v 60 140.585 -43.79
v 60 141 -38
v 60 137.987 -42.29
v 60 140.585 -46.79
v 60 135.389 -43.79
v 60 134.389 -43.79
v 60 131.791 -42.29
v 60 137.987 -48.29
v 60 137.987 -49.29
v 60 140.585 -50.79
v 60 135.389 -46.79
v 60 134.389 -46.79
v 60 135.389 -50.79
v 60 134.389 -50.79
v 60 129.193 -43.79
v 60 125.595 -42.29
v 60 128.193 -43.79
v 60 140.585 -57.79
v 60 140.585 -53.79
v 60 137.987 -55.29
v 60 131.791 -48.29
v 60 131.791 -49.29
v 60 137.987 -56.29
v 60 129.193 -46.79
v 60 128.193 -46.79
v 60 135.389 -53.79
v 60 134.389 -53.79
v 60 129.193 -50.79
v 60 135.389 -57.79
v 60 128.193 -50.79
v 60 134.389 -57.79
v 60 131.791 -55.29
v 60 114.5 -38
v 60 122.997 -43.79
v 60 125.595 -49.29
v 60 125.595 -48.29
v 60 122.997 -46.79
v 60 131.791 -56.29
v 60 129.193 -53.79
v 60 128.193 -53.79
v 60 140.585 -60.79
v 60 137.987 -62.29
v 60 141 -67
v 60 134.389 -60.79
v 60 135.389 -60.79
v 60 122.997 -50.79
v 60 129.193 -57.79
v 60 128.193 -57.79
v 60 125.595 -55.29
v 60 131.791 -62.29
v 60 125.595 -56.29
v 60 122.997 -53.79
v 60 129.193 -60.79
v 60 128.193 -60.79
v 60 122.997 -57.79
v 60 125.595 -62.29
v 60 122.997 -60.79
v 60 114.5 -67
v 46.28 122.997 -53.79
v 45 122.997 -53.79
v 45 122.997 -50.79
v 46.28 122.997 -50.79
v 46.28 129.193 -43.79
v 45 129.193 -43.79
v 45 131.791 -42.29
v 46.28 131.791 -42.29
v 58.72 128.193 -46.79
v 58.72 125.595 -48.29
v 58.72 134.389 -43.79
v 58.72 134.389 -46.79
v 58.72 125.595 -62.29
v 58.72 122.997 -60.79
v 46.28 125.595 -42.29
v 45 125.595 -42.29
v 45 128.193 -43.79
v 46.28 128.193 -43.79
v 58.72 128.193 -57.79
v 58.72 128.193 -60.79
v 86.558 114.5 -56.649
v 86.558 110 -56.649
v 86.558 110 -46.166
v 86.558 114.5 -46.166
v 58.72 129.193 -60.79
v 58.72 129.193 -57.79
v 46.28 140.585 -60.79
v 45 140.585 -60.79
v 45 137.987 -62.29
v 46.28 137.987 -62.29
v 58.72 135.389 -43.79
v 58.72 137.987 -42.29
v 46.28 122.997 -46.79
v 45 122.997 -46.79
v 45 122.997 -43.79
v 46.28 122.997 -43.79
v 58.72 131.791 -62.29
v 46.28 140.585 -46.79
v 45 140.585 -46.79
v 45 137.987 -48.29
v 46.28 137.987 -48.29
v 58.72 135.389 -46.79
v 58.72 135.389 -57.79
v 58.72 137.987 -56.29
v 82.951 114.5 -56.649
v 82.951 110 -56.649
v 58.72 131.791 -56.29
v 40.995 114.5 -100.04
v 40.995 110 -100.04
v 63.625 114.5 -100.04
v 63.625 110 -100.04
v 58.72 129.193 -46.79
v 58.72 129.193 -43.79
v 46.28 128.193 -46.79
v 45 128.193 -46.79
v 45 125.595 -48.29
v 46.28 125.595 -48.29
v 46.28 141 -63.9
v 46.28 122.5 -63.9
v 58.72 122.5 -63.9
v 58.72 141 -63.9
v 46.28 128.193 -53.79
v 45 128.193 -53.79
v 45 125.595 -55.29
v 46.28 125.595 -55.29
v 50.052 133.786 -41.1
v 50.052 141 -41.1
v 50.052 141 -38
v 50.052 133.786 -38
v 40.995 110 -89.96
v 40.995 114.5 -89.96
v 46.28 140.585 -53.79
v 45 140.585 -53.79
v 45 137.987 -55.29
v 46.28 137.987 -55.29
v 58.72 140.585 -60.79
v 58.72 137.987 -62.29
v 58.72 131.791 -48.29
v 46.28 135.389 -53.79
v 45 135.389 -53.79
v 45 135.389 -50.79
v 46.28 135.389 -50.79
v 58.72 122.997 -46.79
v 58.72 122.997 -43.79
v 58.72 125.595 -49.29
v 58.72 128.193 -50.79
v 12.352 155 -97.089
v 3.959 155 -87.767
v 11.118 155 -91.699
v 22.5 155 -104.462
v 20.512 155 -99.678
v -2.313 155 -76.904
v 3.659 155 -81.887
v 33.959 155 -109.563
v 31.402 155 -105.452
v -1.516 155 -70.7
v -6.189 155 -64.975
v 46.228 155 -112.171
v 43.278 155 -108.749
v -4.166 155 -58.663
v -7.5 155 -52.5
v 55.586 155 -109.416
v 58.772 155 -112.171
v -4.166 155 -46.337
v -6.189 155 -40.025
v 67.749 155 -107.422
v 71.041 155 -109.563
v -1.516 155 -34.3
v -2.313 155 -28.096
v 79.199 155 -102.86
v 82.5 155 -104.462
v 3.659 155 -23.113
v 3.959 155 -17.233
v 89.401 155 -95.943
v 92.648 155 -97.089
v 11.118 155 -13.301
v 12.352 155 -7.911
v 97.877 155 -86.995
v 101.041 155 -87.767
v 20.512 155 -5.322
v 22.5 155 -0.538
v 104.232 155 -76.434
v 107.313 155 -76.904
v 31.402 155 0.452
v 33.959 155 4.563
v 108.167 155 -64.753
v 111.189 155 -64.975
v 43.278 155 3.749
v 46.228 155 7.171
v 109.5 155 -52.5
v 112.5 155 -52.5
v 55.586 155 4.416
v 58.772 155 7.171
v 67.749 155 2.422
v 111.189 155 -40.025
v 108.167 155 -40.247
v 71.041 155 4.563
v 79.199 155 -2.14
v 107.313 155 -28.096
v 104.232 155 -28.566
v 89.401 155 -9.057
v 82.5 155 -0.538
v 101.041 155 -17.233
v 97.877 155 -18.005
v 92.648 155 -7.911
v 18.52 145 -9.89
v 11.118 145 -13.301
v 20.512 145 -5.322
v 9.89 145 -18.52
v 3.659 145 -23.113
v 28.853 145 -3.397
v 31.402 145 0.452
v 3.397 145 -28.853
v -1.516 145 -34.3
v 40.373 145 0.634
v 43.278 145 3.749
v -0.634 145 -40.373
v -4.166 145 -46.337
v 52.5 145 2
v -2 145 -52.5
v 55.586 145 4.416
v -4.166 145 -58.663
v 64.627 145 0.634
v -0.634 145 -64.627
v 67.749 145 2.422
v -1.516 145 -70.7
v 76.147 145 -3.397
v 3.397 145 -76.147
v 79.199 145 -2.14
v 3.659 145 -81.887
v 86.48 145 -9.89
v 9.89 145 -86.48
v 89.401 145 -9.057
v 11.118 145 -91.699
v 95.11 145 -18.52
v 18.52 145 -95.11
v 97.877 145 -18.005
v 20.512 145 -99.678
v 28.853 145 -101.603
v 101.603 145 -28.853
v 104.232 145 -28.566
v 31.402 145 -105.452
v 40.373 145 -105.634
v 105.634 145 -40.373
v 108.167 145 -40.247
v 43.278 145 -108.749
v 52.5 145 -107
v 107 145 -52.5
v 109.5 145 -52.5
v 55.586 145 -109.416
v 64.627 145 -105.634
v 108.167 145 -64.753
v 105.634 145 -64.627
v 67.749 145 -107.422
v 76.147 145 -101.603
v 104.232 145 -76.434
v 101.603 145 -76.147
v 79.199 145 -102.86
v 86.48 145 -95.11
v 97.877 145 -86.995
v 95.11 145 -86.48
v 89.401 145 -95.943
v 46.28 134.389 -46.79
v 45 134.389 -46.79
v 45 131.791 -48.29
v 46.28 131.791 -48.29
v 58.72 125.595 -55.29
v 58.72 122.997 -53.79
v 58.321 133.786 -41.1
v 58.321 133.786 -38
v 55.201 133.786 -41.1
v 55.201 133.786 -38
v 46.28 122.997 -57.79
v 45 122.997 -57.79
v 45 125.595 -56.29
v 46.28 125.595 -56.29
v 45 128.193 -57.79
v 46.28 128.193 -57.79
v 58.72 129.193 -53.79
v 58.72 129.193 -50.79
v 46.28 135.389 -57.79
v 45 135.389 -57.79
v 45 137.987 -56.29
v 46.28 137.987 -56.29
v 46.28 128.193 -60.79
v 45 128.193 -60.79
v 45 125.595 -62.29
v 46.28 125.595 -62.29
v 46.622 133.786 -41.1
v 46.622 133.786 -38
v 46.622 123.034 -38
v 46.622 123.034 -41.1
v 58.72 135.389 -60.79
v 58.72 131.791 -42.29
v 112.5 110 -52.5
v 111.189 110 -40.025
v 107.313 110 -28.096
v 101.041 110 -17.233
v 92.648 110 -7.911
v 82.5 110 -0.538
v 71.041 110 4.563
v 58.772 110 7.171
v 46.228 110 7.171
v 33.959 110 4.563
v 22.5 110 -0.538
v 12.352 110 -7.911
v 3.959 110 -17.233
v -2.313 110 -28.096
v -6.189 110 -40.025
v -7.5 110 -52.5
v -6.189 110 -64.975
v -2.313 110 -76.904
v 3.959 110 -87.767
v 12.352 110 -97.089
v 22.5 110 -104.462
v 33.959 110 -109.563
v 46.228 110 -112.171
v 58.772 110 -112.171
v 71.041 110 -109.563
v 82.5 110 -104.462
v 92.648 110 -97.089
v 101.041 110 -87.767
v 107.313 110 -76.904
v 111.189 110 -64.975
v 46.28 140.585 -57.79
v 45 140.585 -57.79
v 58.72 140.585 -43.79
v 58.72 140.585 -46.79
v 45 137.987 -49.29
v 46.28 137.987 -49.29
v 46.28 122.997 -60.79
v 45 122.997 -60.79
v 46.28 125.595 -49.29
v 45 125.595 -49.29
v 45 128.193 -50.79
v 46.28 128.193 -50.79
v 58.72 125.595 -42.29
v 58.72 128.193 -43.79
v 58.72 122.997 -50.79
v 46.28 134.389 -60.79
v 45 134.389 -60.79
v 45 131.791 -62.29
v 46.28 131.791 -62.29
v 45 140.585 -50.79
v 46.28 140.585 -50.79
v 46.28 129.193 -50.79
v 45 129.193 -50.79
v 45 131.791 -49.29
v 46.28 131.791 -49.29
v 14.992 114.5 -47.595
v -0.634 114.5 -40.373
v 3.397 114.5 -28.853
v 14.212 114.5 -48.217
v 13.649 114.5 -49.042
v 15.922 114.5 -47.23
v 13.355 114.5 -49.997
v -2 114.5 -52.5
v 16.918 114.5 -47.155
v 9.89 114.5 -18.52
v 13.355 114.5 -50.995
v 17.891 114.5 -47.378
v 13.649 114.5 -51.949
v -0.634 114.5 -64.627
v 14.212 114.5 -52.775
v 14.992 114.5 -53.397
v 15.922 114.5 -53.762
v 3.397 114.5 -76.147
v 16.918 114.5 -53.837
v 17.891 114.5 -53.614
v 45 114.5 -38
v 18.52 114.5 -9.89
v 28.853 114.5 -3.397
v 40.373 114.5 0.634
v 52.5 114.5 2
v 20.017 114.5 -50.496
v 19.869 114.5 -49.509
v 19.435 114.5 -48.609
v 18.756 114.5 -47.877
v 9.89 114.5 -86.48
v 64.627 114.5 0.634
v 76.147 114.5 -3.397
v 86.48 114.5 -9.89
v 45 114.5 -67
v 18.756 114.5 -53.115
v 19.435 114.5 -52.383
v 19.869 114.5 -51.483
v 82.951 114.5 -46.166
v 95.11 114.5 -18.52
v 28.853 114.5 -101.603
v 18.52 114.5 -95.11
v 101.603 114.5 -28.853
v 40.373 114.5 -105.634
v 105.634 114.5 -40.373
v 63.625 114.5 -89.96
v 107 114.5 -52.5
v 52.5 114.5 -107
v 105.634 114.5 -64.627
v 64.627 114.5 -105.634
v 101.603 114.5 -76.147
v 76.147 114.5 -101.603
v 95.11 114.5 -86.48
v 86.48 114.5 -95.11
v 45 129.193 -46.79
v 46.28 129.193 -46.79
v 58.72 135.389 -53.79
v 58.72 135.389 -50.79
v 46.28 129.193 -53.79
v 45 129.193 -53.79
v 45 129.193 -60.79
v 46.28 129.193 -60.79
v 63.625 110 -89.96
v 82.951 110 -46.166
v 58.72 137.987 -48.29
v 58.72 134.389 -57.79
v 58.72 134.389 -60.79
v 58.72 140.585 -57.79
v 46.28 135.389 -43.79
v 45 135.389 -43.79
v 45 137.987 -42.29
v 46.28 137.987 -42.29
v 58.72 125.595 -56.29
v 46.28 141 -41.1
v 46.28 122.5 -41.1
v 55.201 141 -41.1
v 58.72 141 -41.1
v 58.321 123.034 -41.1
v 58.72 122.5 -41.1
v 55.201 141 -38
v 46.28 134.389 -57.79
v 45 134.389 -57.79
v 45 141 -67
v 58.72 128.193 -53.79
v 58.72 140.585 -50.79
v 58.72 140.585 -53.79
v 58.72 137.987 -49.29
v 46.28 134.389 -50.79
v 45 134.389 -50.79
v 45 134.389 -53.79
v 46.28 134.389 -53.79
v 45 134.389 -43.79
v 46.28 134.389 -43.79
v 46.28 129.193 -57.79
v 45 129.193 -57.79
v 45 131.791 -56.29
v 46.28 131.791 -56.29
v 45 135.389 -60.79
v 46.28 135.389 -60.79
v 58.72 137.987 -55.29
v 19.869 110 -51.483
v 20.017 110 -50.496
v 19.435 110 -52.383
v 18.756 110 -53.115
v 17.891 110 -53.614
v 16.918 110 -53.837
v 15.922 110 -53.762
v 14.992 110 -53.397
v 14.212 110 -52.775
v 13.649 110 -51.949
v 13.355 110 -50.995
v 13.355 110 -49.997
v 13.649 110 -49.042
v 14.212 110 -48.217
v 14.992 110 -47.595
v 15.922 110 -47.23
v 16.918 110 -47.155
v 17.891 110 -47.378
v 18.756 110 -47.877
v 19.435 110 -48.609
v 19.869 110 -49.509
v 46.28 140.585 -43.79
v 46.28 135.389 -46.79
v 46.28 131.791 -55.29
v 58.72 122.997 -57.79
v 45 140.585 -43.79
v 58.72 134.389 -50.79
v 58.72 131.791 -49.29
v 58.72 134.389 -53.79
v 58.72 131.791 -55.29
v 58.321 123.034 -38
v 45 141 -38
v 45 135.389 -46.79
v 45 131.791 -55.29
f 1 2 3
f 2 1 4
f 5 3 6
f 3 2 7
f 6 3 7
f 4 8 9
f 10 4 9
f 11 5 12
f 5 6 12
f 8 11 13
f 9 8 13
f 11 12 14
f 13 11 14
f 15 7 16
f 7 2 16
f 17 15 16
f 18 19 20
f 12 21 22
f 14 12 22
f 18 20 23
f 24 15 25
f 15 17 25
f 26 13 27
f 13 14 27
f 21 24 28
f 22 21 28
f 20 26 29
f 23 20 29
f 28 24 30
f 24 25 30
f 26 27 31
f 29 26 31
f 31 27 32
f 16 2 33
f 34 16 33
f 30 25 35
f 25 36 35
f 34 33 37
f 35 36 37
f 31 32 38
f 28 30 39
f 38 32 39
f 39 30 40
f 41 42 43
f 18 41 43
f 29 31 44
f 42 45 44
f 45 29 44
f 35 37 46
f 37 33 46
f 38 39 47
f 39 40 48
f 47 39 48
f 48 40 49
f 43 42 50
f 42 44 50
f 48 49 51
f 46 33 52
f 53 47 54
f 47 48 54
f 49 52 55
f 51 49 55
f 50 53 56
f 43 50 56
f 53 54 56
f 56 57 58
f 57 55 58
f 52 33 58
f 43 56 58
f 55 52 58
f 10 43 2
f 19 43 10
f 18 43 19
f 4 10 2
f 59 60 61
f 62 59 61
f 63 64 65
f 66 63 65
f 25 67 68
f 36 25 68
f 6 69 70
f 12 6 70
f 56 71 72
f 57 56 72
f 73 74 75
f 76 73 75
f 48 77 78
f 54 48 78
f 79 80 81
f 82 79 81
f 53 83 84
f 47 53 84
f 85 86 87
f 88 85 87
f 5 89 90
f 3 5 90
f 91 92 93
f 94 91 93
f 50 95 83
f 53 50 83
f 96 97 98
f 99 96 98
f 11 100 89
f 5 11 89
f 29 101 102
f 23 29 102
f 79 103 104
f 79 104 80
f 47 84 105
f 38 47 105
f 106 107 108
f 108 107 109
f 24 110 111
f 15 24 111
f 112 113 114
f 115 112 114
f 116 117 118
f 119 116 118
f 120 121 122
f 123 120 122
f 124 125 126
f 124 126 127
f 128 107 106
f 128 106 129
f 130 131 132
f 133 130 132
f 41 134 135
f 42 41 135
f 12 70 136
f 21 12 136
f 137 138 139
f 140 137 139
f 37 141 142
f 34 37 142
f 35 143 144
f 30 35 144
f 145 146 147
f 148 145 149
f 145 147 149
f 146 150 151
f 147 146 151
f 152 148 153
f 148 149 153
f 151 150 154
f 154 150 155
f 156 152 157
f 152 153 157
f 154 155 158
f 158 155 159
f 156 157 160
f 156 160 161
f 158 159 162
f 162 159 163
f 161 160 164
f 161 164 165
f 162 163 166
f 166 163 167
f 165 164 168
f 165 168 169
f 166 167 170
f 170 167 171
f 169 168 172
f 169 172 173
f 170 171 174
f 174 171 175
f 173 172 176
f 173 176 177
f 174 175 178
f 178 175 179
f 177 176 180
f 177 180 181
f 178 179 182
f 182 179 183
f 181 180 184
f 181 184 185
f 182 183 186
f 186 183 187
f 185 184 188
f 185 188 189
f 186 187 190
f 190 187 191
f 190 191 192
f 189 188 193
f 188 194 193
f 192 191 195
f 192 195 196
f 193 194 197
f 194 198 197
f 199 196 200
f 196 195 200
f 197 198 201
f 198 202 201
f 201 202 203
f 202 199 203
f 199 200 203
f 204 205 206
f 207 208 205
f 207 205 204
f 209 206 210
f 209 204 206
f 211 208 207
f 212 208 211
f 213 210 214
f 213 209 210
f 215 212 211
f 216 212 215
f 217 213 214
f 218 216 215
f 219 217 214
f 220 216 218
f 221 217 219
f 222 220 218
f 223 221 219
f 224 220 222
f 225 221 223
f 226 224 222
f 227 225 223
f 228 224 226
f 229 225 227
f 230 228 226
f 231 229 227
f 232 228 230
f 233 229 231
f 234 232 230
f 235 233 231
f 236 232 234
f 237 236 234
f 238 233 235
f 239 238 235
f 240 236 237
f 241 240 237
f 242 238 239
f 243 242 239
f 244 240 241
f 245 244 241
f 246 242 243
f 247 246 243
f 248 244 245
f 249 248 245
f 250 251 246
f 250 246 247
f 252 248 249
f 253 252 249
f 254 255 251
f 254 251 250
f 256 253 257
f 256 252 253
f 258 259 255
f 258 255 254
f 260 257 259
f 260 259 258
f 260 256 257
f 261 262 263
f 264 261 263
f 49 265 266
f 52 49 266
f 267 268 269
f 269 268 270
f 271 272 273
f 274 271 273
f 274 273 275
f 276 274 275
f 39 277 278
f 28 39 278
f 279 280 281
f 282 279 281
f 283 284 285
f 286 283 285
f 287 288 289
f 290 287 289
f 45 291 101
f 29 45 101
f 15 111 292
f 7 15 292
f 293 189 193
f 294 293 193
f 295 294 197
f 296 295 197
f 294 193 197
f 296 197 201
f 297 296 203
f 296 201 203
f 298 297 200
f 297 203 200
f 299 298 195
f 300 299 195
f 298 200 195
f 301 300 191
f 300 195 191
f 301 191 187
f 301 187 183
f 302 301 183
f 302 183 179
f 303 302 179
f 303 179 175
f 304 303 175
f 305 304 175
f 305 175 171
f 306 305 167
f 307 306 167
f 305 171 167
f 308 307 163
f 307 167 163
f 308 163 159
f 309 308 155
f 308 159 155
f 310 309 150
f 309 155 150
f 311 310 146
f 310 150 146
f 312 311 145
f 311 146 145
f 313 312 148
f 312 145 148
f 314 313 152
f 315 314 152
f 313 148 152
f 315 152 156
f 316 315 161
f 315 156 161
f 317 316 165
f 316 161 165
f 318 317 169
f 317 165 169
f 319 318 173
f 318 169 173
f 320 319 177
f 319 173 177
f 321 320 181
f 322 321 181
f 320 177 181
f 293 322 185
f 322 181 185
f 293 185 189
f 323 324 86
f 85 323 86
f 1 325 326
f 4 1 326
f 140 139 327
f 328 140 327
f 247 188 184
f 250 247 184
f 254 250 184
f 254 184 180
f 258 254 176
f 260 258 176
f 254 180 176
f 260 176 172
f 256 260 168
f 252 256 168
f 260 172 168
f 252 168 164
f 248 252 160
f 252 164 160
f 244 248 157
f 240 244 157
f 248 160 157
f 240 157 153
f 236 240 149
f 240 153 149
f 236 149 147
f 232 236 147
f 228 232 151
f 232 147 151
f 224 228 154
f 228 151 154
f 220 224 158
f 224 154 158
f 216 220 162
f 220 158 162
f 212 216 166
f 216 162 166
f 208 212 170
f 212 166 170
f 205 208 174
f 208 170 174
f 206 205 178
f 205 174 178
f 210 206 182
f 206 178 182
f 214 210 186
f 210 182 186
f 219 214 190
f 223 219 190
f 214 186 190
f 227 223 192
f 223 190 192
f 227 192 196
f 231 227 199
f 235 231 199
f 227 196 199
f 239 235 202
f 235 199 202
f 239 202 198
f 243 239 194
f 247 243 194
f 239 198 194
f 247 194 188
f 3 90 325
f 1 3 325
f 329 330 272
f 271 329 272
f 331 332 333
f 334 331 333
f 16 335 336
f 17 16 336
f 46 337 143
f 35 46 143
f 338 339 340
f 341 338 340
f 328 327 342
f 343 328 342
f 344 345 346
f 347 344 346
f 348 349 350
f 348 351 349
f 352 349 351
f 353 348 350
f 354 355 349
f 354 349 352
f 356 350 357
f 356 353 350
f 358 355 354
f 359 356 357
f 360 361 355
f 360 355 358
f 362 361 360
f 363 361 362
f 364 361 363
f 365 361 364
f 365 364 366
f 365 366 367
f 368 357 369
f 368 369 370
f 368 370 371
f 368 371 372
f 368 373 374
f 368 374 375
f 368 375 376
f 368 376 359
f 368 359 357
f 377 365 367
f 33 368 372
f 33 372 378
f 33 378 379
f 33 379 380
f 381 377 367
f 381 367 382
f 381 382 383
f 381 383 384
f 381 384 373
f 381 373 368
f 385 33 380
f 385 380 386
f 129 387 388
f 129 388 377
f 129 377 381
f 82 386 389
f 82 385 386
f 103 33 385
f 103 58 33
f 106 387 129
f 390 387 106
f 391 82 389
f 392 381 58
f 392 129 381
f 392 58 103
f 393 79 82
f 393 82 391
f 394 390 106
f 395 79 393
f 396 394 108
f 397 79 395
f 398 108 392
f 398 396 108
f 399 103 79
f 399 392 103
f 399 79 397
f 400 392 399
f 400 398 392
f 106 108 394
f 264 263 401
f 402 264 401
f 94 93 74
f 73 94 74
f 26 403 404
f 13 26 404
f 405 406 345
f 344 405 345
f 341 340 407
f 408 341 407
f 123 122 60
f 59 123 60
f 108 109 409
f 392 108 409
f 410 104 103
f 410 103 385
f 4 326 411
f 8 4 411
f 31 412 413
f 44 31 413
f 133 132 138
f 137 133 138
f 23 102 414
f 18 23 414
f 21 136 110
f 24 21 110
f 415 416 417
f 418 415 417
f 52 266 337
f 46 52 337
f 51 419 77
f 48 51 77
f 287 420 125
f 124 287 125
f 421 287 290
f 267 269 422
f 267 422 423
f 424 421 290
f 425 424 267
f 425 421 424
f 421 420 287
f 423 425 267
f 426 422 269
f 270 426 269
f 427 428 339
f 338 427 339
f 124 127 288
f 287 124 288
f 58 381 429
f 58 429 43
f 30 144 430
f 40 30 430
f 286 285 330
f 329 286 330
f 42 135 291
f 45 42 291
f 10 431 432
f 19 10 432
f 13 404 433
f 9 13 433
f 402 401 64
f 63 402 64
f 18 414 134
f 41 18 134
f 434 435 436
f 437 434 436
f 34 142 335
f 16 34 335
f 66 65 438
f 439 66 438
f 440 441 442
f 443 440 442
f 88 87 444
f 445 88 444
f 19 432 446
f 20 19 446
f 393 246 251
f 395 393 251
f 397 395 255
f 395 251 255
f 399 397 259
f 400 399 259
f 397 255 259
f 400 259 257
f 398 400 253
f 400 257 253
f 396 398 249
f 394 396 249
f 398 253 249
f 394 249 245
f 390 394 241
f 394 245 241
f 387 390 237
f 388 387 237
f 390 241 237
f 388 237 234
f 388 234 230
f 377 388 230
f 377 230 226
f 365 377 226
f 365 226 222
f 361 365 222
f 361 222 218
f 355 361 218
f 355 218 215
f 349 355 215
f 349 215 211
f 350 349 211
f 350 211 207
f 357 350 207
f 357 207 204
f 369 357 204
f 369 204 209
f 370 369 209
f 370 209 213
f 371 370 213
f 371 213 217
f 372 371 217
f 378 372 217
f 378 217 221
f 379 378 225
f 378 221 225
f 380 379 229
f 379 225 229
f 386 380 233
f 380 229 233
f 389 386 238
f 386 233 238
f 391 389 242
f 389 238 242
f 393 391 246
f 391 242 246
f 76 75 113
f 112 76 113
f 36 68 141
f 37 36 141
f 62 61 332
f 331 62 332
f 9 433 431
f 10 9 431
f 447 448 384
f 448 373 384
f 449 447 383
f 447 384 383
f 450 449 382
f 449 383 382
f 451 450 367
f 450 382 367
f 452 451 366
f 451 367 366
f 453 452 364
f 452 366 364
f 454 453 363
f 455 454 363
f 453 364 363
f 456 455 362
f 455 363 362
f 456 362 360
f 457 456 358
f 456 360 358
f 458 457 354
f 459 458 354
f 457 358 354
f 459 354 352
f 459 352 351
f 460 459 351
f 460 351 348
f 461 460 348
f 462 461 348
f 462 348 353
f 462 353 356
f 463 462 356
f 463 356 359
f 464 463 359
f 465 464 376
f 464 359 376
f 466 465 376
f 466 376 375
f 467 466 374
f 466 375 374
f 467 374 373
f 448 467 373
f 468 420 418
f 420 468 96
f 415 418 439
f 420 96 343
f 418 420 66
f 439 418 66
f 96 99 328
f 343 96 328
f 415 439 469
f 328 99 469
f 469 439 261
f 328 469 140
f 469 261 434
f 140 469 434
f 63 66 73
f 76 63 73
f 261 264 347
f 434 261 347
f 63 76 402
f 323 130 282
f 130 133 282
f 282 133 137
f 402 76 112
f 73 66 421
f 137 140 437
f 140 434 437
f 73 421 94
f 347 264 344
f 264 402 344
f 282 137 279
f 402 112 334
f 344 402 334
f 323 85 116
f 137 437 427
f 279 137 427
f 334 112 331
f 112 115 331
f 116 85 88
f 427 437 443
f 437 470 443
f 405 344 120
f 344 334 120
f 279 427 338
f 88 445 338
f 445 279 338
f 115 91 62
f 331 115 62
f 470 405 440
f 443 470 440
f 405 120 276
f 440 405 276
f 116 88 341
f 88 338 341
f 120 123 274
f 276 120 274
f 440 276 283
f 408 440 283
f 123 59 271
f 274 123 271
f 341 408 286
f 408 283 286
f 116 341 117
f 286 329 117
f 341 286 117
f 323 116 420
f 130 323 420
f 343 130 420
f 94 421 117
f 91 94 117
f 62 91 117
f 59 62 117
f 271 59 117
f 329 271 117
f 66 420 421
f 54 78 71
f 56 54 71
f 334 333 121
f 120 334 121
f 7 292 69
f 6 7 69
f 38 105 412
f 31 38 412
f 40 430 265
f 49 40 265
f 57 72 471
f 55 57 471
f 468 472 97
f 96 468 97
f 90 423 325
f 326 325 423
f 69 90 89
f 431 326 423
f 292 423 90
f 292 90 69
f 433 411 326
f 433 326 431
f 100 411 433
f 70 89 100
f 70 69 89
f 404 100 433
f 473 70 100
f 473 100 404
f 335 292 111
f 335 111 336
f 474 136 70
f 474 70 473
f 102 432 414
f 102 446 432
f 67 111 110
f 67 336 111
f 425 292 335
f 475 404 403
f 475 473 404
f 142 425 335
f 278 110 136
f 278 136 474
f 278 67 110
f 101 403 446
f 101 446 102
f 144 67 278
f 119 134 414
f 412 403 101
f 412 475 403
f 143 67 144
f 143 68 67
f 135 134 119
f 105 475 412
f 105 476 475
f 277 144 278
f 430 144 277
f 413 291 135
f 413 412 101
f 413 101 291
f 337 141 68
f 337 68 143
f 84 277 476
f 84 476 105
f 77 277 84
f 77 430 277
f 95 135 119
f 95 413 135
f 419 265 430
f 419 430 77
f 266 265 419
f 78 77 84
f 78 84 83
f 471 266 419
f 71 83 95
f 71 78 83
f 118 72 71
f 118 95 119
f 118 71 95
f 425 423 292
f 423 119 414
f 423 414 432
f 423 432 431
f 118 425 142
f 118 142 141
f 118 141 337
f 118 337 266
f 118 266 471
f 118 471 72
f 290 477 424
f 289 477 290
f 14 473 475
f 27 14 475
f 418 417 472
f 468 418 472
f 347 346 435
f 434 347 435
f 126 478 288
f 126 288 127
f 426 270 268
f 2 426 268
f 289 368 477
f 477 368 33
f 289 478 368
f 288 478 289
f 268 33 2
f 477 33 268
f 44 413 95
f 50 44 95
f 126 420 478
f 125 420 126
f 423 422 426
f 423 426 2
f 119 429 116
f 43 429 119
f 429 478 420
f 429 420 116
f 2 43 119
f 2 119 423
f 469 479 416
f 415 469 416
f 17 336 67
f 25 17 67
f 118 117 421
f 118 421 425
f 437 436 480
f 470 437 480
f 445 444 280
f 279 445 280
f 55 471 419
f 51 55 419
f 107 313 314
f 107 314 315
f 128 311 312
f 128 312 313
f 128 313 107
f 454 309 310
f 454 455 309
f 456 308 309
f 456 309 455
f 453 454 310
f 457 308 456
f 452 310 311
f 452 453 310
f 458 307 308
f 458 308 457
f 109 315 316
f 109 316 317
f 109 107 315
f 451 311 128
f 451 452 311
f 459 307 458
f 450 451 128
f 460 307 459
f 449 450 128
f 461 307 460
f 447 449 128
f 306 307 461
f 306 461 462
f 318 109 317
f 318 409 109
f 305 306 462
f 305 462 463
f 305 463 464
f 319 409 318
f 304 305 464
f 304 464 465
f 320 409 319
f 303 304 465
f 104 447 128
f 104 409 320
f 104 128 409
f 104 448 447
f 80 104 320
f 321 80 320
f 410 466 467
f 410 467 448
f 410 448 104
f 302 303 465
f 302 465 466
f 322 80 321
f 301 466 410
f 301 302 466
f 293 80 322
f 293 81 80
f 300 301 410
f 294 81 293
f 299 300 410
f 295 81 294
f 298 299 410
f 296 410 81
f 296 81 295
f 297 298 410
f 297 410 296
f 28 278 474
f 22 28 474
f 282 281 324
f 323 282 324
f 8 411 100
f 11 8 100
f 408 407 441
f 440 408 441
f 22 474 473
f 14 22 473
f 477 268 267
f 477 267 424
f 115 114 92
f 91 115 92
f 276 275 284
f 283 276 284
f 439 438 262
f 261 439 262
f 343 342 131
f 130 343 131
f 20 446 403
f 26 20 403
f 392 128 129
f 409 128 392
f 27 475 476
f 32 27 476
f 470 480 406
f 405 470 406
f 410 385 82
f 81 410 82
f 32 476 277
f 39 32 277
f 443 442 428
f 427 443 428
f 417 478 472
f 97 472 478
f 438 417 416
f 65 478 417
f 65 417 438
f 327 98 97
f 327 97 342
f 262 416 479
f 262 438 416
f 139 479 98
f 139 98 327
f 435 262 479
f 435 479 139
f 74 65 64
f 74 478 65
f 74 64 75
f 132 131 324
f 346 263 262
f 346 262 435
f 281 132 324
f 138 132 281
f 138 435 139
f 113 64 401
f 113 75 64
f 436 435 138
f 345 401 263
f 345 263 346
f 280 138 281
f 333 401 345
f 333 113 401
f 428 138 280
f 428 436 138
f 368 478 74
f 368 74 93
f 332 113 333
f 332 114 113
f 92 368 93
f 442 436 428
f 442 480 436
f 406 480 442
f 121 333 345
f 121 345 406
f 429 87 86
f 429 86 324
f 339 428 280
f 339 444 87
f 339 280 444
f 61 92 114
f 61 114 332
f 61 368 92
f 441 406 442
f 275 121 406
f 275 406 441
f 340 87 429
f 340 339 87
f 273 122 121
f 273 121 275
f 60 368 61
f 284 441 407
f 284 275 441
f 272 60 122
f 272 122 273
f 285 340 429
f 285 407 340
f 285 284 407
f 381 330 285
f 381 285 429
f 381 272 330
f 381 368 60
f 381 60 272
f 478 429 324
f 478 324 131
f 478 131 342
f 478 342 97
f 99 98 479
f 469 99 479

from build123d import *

# Parameters (mm, degrees)
SKETCH046_R          = 60
PAD019_DEPTH         = 45
SKETCH047_R          = 54.5
POCKET020_DEPTH      = 40.5
SKETCH054_W          = 13.996185
SKETCH054_H          = 10.514995
POCKET022_DEPTH      = 3
SKETCH055_W          = 3.607353
SKETCH055_H          = 10.482647
POCKET023_DEPTH      = 46.501
SKETCH056_W          = 22.63
SKETCH056_H          = 10.08
POCKET024_DEPTH      = 5
SKETCH058_R          = 3.35
POCKET025_DEPTH      = 5
POCKET025_DEPTH_BACK = 100
SKETCH059_R          = 57
POCKET026_DEPTH      = 10
SKETCH061_W          = 15
SKETCH061_H          = 29
PAD028_DEPTH         = 26.5
SKETCH062_W          = 12.44
SKETCH062_H          = 22.8
POCKET027_DEPTH      = 12.5
POCKET027_DEPTH_BACK = 6
SKETCH063_W          = 11.698539
SKETCH063_H          = 10.75206
POCKET031_DEPTH      = 5
POCKET032_DEPTH      = 18.28
SKETCH070_W          = 5.148875
SKETCH070_H          = 8.518356
POCKET033_DEPTH      = 5


with BuildPart() as part:
    # Sketch046 → Pad019 (new body)
    with BuildSketch(Plane.XZ):
        with Locations((52.5, -52.5)):
            Circle(SKETCH046_R)
    extrude(amount=PAD019_DEPTH)

    # Sketch047 (on Face2 of Pad019) → Pocket020 (cut)
    with BuildSketch(Plane(origin=(0, 0, 0), x_dir=(1, 0, 0), z_dir=(0, 1, 0))):
        with Locations((52.5, 52.5)):
            Circle(SKETCH047_R)
    extrude(amount=-POCKET020_DEPTH, mode=Mode.SUBTRACT)

    # Sketch054 → Pocket022 (cut)
    with BuildSketch(Plane.XZ.offset(52.5)):
        with Locations((89.9295195, -51.4149685)):
            Rectangle(SKETCH054_W, SKETCH054_H)
    extrude(amount=-POCKET022_DEPTH, mode=Mode.SUBTRACT)

    # Sketch055 (on Face37 of Pocket022) → Pocket023 (cut, through all)
    with BuildSketch(Plane.XZ.offset(46.5)):
        with Locations((84.7541845, -51.4075485)):
            Rectangle(SKETCH055_W, SKETCH055_H)
    extrude(amount=-POCKET023_DEPTH, mode=Mode.SUBTRACT)

    # Sketch056 (on Face3 of Pocket023) → Pocket024 (cut)
    with BuildSketch(Plane.XZ.offset(45)):
        with Locations((52.3097458031, -95.0004416785)):
            Rectangle(SKETCH056_W, SKETCH056_H)
    extrude(amount=-POCKET024_DEPTH, mode=Mode.SUBTRACT)

    # Sketch058 → Pocket025 (cut, two sides)
    with BuildSketch(Plane(origin=(0, -44.5, 0), x_dir=(1, 0, 0), z_dir=(0, 1, 0))) as pocket025_sk:
        with Locations((16.6674273862, 50.4959887414)):
            Circle(SKETCH058_R)
    extrude(amount=-POCKET025_DEPTH, mode=Mode.SUBTRACT)
    extrude(pocket025_sk.sketch, amount=POCKET025_DEPTH_BACK, mode=Mode.SUBTRACT)

    # Sketch059 (on Face2 of Pocket025) → Pocket026 (cut)
    with BuildSketch(Plane(origin=(0, 0, 0), x_dir=(1, 0, 0), z_dir=(0, 1, 0))):
        with Locations((52.5, 52.5)):
            Circle(SKETCH059_R)
    extrude(amount=-POCKET026_DEPTH, mode=Mode.SUBTRACT)

    # Sketch061 (on Face15 of Pocket026) → Pad028 (join)
    with BuildSketch(Plane(origin=(0, -40.5, 0), x_dir=(1, 0, 0), z_dir=(0, 1, 0))):
        with Locations((52.5, 52.5)):
            Rectangle(SKETCH061_W, SKETCH061_H)
    extrude(amount=PAD028_DEPTH)

    # Sketch062 → Pocket027 (cut, two sides)
    with BuildSketch(Plane(origin=(0, -20, 0), x_dir=(1, 0, 0), z_dir=(0, 1, 0))) as pocket027_sk:
        with Locations((52.5, 52.5)):
            Rectangle(SKETCH062_W, SKETCH062_H)
    extrude(amount=-POCKET027_DEPTH, mode=Mode.SUBTRACT)
    extrude(pocket027_sk.sketch, amount=POCKET027_DEPTH_BACK, mode=Mode.SUBTRACT)

    # Sketch063 (on Face18 of Pocket027) → Pocket031 (cut)
    with BuildSketch(Plane(origin=(0, 0, -38), x_dir=(-1, 0, 0), z_dir=(0, 0, 1))):
        with Locations((-52.4716495, 26.589729)):
            Rectangle(SKETCH063_W, SKETCH063_H)
    extrude(amount=-POCKET031_DEPTH, mode=Mode.SUBTRACT)

    # Sketch064 (on Face17 of Pocket031) → Pocket032 (cut)
    with BuildSketch(Plane(origin=(45, 0, 0), x_dir=(0, 0, -1), z_dir=(-1, 0, 0))):
        Polygon((48.289669, 29.4052434227), (46.789669, 32.0033196341), (43.789669, 32.0033196341), (42.289669, 29.4052434227), (43.789669, 26.8071672114), (46.789669, 26.8071672114), align=None)
        Polygon((48.289669, 23.209091), (46.789669, 25.8071672114), (43.789669, 25.8071672114), (42.289669, 23.209091), (43.789669, 20.6110147886), (46.789669, 20.6110147886), align=None)
        Polygon((55.289669, 29.4052434227), (53.789669, 32.0033196341), (50.789669, 32.0033196341), (49.289669, 29.4052434227), (50.789669, 26.8071672114), (53.789669, 26.8071672114), align=None)
        Polygon((55.289669, 23.209091), (53.789669, 25.8071672114), (50.789669, 25.8071672114), (49.289669, 23.209091), (50.789669, 20.6110147886), (53.789669, 20.6110147886), align=None)
        Polygon((62.289669, 29.4052434227), (60.789669, 32.0033196341), (57.789669, 32.0033196341), (56.289669, 29.4052434227), (57.789669, 26.8071672114), (60.789669, 26.8071672114), align=None)
        Polygon((62.289669, 23.209091), (60.789669, 25.8071672114), (57.789669, 25.8071672114), (56.289669, 23.209091), (57.789669, 20.6110147886), (60.789669, 20.6110147886), align=None)
        Polygon((48.289669, 17.0129385773), (46.789669, 19.6110147886), (43.789669, 19.6110147886), (42.289669, 17.0129385773), (43.789669, 14.4148623659), (46.789669, 14.4148623659), align=None)
        Polygon((55.289669, 17.0129385773), (53.789669, 19.6110147886), (50.789669, 19.6110147886), (49.289669, 17.0129385773), (50.789669, 14.4148623659), (53.789669, 14.4148623659), align=None)
        Polygon((62.289669, 17.0129385773), (60.789669, 19.6110147886), (57.789669, 19.6110147886), (56.289669, 17.0129385773), (57.789669, 14.4148623659), (60.789669, 14.4148623659), align=None)
    extrude(amount=-POCKET032_DEPTH, mode=Mode.SUBTRACT)

    # Sketch070 (on Face167 of Pad029) → Pocket033 (cut)
    with BuildSketch(Plane(origin=(0, 0, -41.1), x_dir=(1, 0, 0), z_dir=(0, 0, -1))):
        with Locations((52.6262685, 17.84922)):
            Rectangle(SKETCH070_W, SKETCH070_H)
    extrude(amount=-POCKET033_DEPTH, mode=Mode.SUBTRACT)


with BuildPart() as part_1:
    # Body008 placement: moved
    add(part.part.moved(Location((0, 155, 0))))


solid = part_1.part
